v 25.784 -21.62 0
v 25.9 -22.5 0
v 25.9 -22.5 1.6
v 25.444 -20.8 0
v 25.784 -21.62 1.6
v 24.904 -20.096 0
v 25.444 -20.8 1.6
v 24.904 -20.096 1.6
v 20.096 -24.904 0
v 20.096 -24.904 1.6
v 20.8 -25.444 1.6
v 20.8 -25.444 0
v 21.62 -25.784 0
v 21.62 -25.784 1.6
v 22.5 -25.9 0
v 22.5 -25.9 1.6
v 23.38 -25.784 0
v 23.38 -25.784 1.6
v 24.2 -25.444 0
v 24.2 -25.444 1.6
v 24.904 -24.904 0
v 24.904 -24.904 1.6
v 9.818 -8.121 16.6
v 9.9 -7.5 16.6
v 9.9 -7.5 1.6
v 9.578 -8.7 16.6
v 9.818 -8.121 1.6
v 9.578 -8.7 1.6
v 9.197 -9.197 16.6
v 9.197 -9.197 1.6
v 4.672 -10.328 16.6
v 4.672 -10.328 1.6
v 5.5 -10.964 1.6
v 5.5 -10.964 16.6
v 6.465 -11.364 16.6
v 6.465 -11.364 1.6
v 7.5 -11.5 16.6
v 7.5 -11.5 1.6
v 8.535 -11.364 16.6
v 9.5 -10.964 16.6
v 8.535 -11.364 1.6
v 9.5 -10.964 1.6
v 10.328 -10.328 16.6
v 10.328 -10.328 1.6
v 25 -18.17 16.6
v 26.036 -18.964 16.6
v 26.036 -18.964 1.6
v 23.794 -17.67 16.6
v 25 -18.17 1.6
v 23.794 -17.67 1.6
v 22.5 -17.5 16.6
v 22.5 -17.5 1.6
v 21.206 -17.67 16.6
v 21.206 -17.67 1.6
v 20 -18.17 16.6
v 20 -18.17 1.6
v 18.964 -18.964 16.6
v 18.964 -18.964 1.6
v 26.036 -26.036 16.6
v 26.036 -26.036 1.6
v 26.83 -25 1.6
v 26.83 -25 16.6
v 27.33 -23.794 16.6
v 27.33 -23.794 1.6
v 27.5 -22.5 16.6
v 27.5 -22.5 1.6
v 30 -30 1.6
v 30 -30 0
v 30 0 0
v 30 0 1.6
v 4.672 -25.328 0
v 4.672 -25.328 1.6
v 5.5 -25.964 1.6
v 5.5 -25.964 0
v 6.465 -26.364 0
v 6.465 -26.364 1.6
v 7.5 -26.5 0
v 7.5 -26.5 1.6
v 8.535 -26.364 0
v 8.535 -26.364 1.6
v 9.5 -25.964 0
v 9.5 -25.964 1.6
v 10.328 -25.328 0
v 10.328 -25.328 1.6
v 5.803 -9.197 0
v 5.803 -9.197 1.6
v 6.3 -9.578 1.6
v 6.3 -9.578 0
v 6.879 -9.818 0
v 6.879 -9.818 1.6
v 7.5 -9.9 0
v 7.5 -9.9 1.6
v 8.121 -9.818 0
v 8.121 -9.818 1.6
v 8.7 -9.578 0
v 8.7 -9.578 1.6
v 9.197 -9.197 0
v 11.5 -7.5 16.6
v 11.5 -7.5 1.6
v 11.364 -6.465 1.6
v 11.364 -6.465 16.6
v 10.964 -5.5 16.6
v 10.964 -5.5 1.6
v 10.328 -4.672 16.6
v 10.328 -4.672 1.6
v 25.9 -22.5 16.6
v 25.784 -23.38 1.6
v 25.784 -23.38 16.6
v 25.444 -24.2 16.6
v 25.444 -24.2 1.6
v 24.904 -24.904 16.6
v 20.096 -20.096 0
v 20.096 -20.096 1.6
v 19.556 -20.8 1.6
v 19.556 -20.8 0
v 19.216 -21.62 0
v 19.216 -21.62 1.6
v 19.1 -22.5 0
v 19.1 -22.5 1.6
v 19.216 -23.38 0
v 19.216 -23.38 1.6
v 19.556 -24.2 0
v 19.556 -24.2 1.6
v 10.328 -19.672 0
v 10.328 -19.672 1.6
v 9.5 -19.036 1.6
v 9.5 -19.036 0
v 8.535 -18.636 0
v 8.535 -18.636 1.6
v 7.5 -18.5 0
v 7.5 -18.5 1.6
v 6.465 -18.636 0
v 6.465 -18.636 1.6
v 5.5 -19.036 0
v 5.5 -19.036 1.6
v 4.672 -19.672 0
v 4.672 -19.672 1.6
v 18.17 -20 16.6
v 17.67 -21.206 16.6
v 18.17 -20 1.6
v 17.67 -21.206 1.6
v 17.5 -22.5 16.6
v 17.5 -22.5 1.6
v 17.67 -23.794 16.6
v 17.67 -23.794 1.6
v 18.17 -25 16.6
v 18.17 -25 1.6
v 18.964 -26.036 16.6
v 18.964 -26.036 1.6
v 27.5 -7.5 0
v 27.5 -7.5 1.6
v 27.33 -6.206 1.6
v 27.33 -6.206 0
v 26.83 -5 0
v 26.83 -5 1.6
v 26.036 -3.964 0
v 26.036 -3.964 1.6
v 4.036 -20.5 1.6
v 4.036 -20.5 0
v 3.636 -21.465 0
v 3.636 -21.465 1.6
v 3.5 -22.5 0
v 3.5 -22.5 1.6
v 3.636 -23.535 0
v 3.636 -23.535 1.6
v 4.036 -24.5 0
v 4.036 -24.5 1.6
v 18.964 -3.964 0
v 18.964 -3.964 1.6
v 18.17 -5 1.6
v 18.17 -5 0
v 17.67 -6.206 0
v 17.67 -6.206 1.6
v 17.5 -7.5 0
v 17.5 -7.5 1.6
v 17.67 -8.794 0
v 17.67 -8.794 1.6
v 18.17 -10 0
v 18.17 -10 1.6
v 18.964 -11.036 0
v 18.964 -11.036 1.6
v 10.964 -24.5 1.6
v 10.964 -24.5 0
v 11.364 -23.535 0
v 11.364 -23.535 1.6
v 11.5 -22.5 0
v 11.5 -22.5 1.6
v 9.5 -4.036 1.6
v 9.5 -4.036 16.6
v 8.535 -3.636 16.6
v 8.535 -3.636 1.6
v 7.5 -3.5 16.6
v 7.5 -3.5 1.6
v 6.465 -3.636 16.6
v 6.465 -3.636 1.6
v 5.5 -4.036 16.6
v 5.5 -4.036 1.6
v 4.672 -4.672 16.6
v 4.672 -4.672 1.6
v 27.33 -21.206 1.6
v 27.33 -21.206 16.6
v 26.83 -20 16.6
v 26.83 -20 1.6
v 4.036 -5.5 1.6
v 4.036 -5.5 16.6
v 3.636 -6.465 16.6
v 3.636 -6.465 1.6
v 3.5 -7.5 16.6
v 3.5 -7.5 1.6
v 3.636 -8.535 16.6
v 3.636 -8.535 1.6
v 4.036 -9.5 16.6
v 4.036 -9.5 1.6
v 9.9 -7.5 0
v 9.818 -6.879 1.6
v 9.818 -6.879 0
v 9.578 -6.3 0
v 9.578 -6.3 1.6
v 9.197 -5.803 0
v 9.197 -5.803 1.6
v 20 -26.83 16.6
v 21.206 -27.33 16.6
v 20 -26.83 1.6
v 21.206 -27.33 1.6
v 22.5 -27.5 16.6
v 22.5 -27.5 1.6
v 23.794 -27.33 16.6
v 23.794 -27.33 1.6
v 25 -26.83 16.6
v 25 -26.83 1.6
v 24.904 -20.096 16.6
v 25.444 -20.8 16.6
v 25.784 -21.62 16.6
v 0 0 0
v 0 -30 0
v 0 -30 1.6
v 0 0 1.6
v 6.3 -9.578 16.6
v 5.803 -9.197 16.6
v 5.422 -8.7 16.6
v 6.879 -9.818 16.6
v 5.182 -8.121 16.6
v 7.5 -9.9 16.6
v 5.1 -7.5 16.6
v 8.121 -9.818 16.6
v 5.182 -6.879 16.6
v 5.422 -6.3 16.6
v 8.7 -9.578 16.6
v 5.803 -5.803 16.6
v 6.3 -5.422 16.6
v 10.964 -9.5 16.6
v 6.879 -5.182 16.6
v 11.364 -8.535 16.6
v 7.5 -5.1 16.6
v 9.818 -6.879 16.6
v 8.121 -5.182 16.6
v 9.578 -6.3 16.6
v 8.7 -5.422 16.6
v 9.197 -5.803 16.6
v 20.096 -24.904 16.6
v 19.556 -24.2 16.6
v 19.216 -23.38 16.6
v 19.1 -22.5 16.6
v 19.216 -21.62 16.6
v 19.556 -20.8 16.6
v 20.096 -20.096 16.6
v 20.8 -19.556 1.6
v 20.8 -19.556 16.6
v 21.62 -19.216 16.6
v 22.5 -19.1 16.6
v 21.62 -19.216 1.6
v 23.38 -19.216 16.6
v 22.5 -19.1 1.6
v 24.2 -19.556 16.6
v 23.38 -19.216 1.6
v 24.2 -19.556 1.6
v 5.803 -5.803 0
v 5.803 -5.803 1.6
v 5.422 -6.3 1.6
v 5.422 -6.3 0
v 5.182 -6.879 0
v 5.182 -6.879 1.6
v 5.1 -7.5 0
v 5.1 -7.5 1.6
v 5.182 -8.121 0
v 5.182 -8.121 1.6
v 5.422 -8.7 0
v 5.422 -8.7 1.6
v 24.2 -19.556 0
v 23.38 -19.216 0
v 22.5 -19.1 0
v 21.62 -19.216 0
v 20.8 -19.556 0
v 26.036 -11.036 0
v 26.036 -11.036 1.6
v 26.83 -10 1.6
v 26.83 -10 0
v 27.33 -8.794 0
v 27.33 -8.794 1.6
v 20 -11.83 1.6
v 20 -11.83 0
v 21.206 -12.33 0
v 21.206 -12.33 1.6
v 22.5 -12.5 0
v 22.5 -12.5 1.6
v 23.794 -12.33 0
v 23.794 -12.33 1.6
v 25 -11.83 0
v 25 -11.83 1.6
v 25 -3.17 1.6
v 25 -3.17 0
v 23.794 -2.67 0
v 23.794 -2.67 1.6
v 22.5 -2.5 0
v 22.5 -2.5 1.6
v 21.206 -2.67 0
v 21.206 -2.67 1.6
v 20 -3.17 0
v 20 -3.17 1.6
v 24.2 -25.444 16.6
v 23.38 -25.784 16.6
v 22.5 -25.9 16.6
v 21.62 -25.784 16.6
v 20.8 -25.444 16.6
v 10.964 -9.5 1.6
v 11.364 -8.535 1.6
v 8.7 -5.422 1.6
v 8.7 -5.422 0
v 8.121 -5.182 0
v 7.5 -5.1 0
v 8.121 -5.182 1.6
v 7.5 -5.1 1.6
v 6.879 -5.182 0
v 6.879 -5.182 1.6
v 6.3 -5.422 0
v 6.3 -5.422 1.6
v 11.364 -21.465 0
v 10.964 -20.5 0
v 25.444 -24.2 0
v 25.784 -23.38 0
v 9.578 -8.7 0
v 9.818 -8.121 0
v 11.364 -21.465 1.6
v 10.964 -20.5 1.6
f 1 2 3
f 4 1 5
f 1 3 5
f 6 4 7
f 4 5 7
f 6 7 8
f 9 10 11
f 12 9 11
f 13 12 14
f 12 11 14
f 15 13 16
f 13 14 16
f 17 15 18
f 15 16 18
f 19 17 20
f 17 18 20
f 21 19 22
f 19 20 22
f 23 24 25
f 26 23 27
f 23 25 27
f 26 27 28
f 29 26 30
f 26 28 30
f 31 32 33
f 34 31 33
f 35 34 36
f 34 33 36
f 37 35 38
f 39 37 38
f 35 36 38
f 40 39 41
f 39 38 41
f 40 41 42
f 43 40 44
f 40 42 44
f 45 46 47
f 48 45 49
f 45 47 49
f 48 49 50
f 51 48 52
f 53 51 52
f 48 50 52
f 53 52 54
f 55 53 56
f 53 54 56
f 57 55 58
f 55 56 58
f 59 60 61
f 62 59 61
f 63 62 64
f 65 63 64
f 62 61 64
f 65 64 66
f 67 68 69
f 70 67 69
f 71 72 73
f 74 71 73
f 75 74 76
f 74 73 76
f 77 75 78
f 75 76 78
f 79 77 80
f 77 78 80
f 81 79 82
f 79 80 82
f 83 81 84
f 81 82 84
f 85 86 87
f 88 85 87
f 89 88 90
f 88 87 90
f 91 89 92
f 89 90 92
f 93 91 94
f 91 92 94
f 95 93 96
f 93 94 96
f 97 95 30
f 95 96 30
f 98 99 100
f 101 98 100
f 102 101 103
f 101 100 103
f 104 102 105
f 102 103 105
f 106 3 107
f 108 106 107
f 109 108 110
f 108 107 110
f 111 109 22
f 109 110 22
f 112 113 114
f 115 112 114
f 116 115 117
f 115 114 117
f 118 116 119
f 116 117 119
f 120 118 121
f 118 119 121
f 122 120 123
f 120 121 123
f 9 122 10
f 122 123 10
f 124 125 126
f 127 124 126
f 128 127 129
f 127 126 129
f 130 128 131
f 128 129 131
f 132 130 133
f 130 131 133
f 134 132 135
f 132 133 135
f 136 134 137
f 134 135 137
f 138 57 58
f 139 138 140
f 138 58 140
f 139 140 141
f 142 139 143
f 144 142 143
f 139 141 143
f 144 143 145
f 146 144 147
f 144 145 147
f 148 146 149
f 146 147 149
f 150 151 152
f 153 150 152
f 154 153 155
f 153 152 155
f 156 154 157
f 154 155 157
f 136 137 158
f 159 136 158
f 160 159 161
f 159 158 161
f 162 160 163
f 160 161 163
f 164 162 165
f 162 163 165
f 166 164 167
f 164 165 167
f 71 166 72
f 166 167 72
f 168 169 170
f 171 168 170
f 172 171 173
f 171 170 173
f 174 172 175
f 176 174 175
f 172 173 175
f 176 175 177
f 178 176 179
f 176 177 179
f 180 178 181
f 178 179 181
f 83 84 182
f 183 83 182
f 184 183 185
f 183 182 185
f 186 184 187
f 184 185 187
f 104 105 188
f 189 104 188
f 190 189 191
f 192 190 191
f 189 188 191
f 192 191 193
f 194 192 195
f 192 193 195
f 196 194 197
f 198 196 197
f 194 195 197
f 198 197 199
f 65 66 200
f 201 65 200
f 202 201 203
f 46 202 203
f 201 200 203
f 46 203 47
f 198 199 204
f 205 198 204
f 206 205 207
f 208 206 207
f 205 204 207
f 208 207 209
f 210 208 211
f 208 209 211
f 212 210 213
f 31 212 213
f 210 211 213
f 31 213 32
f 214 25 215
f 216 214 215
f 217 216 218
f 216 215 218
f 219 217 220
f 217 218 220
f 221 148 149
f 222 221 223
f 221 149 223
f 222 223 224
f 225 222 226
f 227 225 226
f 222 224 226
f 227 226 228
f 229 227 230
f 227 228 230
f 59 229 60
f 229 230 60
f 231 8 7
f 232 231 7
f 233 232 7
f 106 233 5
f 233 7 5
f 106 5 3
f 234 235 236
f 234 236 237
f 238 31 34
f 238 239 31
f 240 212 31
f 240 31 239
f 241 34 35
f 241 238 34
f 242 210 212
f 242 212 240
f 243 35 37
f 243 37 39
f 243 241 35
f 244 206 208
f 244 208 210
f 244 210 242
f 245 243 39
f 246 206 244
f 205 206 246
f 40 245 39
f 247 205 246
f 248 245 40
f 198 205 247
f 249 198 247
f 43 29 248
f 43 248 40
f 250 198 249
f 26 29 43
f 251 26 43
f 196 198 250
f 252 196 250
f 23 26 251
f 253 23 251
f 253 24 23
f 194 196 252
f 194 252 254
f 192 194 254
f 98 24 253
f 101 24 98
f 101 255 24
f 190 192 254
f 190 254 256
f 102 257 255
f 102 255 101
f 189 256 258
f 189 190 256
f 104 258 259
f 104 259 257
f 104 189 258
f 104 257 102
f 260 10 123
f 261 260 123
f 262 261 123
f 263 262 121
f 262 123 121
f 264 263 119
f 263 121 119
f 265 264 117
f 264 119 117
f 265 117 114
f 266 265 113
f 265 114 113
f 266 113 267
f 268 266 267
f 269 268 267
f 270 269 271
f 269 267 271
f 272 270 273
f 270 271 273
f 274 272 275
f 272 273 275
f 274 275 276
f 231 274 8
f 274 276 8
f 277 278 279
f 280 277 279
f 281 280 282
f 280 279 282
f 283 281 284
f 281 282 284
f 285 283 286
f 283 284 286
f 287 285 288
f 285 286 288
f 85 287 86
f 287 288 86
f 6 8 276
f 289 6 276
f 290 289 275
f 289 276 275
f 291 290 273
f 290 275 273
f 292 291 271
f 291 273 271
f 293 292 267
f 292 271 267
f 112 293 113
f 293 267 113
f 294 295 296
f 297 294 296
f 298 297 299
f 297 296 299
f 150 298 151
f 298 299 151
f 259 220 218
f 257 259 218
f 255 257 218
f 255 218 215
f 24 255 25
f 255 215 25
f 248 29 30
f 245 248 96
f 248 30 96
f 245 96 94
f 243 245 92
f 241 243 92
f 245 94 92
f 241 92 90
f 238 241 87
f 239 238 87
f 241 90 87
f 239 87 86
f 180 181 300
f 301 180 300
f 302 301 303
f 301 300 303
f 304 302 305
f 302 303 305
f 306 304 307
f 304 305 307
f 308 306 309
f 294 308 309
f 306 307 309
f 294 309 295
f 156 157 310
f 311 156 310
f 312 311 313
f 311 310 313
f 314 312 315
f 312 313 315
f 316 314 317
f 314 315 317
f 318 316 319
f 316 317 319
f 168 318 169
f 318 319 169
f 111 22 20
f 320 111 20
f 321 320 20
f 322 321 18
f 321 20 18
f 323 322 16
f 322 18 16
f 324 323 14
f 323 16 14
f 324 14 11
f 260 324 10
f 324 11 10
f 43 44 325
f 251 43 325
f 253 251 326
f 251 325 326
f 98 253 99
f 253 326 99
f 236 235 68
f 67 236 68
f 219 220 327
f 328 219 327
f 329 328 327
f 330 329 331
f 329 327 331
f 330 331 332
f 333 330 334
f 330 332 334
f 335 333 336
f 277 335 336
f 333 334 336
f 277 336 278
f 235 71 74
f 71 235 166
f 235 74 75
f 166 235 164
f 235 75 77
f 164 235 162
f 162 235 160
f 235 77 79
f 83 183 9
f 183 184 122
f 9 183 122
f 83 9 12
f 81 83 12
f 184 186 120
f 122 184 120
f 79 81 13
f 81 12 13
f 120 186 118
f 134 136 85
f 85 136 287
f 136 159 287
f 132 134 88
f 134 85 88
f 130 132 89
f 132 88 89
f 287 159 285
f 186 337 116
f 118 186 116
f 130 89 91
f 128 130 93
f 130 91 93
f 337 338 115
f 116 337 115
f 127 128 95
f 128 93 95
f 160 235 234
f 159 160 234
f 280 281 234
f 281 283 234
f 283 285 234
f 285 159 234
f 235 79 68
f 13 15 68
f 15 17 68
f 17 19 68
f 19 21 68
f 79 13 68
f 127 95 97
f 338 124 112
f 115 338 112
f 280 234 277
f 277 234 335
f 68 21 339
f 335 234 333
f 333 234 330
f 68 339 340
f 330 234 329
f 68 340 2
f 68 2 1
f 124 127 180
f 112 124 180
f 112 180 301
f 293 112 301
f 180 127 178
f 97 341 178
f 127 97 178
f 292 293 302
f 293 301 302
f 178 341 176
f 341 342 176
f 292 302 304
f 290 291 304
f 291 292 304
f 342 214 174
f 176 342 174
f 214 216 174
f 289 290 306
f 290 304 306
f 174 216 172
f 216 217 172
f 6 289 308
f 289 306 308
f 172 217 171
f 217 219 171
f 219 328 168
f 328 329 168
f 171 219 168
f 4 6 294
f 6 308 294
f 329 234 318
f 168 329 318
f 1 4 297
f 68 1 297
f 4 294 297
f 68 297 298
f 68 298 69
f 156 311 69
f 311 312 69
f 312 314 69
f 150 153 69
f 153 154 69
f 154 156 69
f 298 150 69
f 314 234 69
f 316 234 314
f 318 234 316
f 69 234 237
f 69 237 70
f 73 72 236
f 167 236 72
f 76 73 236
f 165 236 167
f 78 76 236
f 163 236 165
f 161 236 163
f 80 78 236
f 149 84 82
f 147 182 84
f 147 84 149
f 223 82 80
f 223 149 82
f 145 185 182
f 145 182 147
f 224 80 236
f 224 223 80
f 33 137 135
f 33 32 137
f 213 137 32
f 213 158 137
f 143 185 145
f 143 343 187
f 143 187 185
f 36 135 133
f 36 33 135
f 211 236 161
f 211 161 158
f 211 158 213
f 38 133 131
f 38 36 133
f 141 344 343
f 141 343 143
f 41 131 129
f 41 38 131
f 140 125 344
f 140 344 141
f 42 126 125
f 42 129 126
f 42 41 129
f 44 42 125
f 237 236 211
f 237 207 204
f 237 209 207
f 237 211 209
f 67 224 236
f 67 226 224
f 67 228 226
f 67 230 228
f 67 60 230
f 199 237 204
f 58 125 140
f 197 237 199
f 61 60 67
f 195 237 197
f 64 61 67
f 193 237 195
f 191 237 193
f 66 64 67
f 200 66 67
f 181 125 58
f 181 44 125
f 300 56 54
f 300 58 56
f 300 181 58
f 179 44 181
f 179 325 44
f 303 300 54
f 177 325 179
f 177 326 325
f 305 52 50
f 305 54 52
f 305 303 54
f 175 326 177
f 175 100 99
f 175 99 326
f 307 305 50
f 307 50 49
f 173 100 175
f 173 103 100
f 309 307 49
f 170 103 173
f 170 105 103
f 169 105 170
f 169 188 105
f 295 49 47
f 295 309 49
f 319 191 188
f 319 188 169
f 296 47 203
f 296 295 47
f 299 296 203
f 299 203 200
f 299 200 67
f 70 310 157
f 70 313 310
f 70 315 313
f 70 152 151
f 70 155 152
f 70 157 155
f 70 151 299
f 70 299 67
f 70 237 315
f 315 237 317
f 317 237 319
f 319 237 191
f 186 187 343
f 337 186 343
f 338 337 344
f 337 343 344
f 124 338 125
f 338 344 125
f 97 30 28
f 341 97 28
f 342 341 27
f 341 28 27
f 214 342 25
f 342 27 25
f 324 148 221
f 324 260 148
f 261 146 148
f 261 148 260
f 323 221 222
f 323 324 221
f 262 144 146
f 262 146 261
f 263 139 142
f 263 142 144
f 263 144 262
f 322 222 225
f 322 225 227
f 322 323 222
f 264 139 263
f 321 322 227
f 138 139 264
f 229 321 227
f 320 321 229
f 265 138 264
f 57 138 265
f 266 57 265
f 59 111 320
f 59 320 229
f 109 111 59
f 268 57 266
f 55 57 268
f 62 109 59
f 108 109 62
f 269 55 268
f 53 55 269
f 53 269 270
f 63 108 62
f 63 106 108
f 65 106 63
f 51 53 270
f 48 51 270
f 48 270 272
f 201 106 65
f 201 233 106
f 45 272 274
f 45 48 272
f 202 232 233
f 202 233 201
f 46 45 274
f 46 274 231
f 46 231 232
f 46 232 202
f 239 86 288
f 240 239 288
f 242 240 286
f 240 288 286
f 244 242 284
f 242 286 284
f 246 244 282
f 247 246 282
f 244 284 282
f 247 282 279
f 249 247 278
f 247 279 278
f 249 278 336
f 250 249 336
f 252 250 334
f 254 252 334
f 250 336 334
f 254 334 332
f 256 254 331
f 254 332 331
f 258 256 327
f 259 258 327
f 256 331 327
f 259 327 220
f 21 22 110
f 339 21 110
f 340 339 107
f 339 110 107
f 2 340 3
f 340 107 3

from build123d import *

# Parameters (mm, degrees)
F0_W     = 30
F0_H     = 30
F1_DEPTH = 1.6
F3_DEPTH = 15
F4_DEPTH = 25


with BuildPart() as f1:
    # F0 (on Top) → F1 (new body)
    with BuildSketch(Plane.XY):
        with Locations((15, -15)):
            Rectangle(F0_W, F0_H)
    extrude(amount=F1_DEPTH)

    # F2 (on face) → F3 (join)
    with BuildSketch(Plane.XY.offset(1.6)):
        with BuildLine():
            Line((5.8029437252, -5.8029437252), (4.6715728753, -4.6715728753))
            ThreePointArc((4.6715728753, -4.6715728753), (3.5, -7.5), (4.6715728753, -10.3284271247))
            Line((4.6715728753, -10.3284271247), (5.8029437252, -9.1970562748))
            ThreePointArc((5.8029437252, -9.1970562748), (5.1, -7.5), (5.8029437252, -5.8029437252))
        make_face()
        with BuildLine():
            ThreePointArc((10.3284271247, -4.6715728753), (7.5, -3.5), (4.6715728753, -4.6715728753))
            Line((4.6715728753, -4.6715728753), (5.8029437252, -5.8029437252))
            ThreePointArc((5.8029437252, -5.8029437252), (7.5, -5.1), (9.1970562748, -5.8029437252))
            Line((9.1970562748, -5.8029437252), (10.3284271247, -4.6715728753))
        make_face()
        with BuildLine():
            ThreePointArc((11.5, -7.5), (11.19551813, -5.9692662705), (10.3284271247, -4.6715728753))
            Line((10.3284271247, -4.6715728753), (9.1970562748, -5.8029437252))
            ThreePointArc((9.1970562748, -5.8029437252), (9.717310878, -6.5815597623), (9.9, -7.5))
            ThreePointArc((9.9, -7.5), (9.717310878, -8.4184402377), (9.1970562748, -9.1970562748))
            Line((9.1970562748, -9.1970562748), (10.3284271247, -10.3284271247))
            ThreePointArc((10.3284271247, -10.3284271247), (11.19551813, -9.0307337295), (11.5, -7.5))
        make_face()
        with BuildLine():
            Line((5.8029437252, -9.1970562748), (4.6715728753, -10.3284271247))
            ThreePointArc((4.6715728753, -10.3284271247), (7.5, -11.5), (10.3284271247, -10.3284271247))
            Line((10.3284271247, -10.3284271247), (9.1970562748, -9.1970562748))
            ThreePointArc((9.1970562748, -9.1970562748), (7.5, -9.9), (5.8029437252, -9.1970562748))
        make_face()
        with BuildLine():
            ThreePointArc((18.9644660941, -18.9644660941), (17.5, -22.5), (18.9644660941, -26.0355339059))
            Line((18.9644660941, -26.0355339059), (20.095836944, -24.904163056))
            ThreePointArc((20.095836944, -24.904163056), (19.1, -22.5), (20.095836944, -20.095836944))
            Line((20.095836944, -20.095836944), (18.9644660941, -18.9644660941))
        make_face()
        with BuildLine():
            Line((24.904163056, -20.095836944), (26.0355339059, -18.9644660941))
            ThreePointArc((26.0355339059, -18.9644660941), (22.5, -17.5), (18.9644660941, -18.9644660941))
            Line((18.9644660941, -18.9644660941), (20.095836944, -20.095836944))
            ThreePointArc((20.095836944, -20.095836944), (22.5, -19.1), (24.904163056, -20.095836944))
        make_face()
        with BuildLine():
            ThreePointArc((27.5, -22.5), (27.1193976626, -20.5865828382), (26.0355339059, -18.9644660941))
            Line((26.0355339059, -18.9644660941), (24.904163056, -20.095836944))
            ThreePointArc((24.904163056, -20.095836944), (25.6411904105, -21.19887633), (25.9, -22.5))
            ThreePointArc((25.9, -22.5), (25.6411904105, -23.80112367), (24.904163056, -24.904163056))
            Line((24.904163056, -24.904163056), (26.0355339059, -26.0355339059))
            ThreePointArc((26.0355339059, -26.0355339059), (27.1193976626, -24.4134171618), (27.5, -22.5))
        make_face()
        with BuildLine():
            Line((20.095836944, -24.904163056), (18.9644660941, -26.0355339059))
            ThreePointArc((18.9644660941, -26.0355339059), (22.5, -27.5), (26.0355339059, -26.0355339059))
            Line((26.0355339059, -26.0355339059), (24.904163056, -24.904163056))
            ThreePointArc((24.904163056, -24.904163056), (22.5, -25.9), (20.095836944, -24.904163056))
        make_face()
    extrude(amount=F3_DEPTH)

    # F2 (on face) → F4 (cut)
    with BuildSketch(Plane.XY.offset(1.6)):
        with BuildLine():
            Line((26.0355339059, -11.0355339059), (22.5, -7.5))
            Line((22.5, -7.5), (18.9644660941, -11.0355339059))
            ThreePointArc((18.9644660941, -11.0355339059), (22.5, -12.5), (26.0355339059, -11.0355339059))
        make_face()
        with BuildLine():
            Line((22.5, -7.5), (18.9644660941, -3.9644660941))
            ThreePointArc((18.9644660941, -3.9644660941), (17.5, -7.5), (18.9644660941, -11.0355339059))
            Line((18.9644660941, -11.0355339059), (22.5, -7.5))
        make_face()
        with BuildLine():
            ThreePointArc((26.0355339059, -3.9644660941), (22.5, -2.5), (18.9644660941, -3.9644660941))
            Line((18.9644660941, -3.9644660941), (22.5, -7.5))
            Line((22.5, -7.5), (26.0355339059, -3.9644660941))
        make_face()
        with BuildLine():
            Line((26.0355339059, -3.9644660941), (22.5, -7.5))
            Line((22.5, -7.5), (26.0355339059, -11.0355339059))
            ThreePointArc((26.0355339059, -11.0355339059), (27.1193976626, -9.4134171618), (27.5, -7.5))
            ThreePointArc((27.5, -7.5), (27.1193976626, -5.5865828382), (26.0355339059, -3.9644660941))
        make_face()
        with BuildLine():
            Line((9.1970562748, -5.8029437252), (7.5, -7.5))
            Line((7.5, -7.5), (9.1970562748, -9.1970562748))
            ThreePointArc((9.1970562748, -9.1970562748), (9.717310878, -8.4184402377), (9.9, -7.5))
            ThreePointArc((9.9, -7.5), (9.717310878, -6.5815597623), (9.1970562748, -5.8029437252))
        make_face()
        with BuildLine():
            ThreePointArc((9.1970562748, -5.8029437252), (7.5, -5.1), (5.8029437252, -5.8029437252))
            Line((5.8029437252, -5.8029437252), (7.5, -7.5))
            Line((7.5, -7.5), (9.1970562748, -5.8029437252))
        make_face()
        with BuildLine():
            Line((7.5, -7.5), (5.8029437252, -5.8029437252))
            ThreePointArc((5.8029437252, -5.8029437252), (5.1, -7.5), (5.8029437252, -9.1970562748))
            Line((5.8029437252, -9.1970562748), (7.5, -7.5))
        make_face()
        with BuildLine():
            Line((9.1970562748, -9.1970562748), (7.5, -7.5))
            Line((7.5, -7.5), (5.8029437252, -9.1970562748))
            ThreePointArc((5.8029437252, -9.1970562748), (7.5, -9.9), (9.1970562748, -9.1970562748))
        make_face()
        with BuildLine():
            ThreePointArc((10.3284271247, -19.6715728753), (7.5, -18.5), (4.6715728753, -19.6715728753))
            Line((4.6715728753, -19.6715728753), (7.5, -22.5))
            Line((7.5, -22.5), (10.3284271247, -19.6715728753))
        make_face()
        with BuildLine():
            Line((10.3284271247, -19.6715728753), (7.5, -22.5))
            Line((7.5, -22.5), (10.3284271247, -25.3284271247))
            ThreePointArc((10.3284271247, -25.3284271247), (11.19551813, -24.0307337295), (11.5, -22.5))
            ThreePointArc((11.5, -22.5), (11.19551813, -20.9692662705), (10.3284271247, -19.6715728753))
        make_face()
        with BuildLine():
            Line((10.3284271247, -25.3284271247), (7.5, -22.5))
            Line((7.5, -22.5), (4.6715728753, -25.3284271247))
            ThreePointArc((4.6715728753, -25.3284271247), (7.5, -26.5), (10.3284271247, -25.3284271247))
        make_face()
        with BuildLine():
            Line((7.5, -22.5), (4.6715728753, -19.6715728753))
            ThreePointArc((4.6715728753, -19.6715728753), (3.5, -22.5), (4.6715728753, -25.3284271247))
            Line((4.6715728753, -25.3284271247), (7.5, -22.5))
        make_face()
        with BuildLine():
            ThreePointArc((20.095836944, -20.095836944), (19.1, -22.5), (20.095836944, -24.904163056))
            Line((20.095836944, -24.904163056), (22.5, -22.5))
            Line((22.5, -22.5), (20.095836944, -20.095836944))
        make_face()
        with BuildLine():
            Line((22.5, -22.5), (24.904163056, -20.095836944))
            ThreePointArc((24.904163056, -20.095836944), (22.5, -19.1), (20.095836944, -20.095836944))
            Line((20.095836944, -20.095836944), (22.5, -22.5))
        make_face()
        with BuildLine():
            ThreePointArc((25.9, -22.5), (25.6411904105, -21.19887633), (24.904163056, -20.095836944))
            Line((24.904163056, -20.095836944), (22.5, -22.5))
            Line((22.5, -22.5), (24.904163056, -24.904163056))
            ThreePointArc((24.904163056, -24.904163056), (25.6411904105, -23.80112367), (25.9, -22.5))
        make_face()
        with BuildLine():
            Line((22.5, -22.5), (20.095836944, -24.904163056))
            ThreePointArc((20.095836944, -24.904163056), (22.5, -25.9), (24.904163056, -24.904163056))
            Line((24.904163056, -24.904163056), (22.5, -22.5))
        make_face()
    extrude(amount=-F4_DEPTH, mode=Mode.SUBTRACT)


solid = f1.part
